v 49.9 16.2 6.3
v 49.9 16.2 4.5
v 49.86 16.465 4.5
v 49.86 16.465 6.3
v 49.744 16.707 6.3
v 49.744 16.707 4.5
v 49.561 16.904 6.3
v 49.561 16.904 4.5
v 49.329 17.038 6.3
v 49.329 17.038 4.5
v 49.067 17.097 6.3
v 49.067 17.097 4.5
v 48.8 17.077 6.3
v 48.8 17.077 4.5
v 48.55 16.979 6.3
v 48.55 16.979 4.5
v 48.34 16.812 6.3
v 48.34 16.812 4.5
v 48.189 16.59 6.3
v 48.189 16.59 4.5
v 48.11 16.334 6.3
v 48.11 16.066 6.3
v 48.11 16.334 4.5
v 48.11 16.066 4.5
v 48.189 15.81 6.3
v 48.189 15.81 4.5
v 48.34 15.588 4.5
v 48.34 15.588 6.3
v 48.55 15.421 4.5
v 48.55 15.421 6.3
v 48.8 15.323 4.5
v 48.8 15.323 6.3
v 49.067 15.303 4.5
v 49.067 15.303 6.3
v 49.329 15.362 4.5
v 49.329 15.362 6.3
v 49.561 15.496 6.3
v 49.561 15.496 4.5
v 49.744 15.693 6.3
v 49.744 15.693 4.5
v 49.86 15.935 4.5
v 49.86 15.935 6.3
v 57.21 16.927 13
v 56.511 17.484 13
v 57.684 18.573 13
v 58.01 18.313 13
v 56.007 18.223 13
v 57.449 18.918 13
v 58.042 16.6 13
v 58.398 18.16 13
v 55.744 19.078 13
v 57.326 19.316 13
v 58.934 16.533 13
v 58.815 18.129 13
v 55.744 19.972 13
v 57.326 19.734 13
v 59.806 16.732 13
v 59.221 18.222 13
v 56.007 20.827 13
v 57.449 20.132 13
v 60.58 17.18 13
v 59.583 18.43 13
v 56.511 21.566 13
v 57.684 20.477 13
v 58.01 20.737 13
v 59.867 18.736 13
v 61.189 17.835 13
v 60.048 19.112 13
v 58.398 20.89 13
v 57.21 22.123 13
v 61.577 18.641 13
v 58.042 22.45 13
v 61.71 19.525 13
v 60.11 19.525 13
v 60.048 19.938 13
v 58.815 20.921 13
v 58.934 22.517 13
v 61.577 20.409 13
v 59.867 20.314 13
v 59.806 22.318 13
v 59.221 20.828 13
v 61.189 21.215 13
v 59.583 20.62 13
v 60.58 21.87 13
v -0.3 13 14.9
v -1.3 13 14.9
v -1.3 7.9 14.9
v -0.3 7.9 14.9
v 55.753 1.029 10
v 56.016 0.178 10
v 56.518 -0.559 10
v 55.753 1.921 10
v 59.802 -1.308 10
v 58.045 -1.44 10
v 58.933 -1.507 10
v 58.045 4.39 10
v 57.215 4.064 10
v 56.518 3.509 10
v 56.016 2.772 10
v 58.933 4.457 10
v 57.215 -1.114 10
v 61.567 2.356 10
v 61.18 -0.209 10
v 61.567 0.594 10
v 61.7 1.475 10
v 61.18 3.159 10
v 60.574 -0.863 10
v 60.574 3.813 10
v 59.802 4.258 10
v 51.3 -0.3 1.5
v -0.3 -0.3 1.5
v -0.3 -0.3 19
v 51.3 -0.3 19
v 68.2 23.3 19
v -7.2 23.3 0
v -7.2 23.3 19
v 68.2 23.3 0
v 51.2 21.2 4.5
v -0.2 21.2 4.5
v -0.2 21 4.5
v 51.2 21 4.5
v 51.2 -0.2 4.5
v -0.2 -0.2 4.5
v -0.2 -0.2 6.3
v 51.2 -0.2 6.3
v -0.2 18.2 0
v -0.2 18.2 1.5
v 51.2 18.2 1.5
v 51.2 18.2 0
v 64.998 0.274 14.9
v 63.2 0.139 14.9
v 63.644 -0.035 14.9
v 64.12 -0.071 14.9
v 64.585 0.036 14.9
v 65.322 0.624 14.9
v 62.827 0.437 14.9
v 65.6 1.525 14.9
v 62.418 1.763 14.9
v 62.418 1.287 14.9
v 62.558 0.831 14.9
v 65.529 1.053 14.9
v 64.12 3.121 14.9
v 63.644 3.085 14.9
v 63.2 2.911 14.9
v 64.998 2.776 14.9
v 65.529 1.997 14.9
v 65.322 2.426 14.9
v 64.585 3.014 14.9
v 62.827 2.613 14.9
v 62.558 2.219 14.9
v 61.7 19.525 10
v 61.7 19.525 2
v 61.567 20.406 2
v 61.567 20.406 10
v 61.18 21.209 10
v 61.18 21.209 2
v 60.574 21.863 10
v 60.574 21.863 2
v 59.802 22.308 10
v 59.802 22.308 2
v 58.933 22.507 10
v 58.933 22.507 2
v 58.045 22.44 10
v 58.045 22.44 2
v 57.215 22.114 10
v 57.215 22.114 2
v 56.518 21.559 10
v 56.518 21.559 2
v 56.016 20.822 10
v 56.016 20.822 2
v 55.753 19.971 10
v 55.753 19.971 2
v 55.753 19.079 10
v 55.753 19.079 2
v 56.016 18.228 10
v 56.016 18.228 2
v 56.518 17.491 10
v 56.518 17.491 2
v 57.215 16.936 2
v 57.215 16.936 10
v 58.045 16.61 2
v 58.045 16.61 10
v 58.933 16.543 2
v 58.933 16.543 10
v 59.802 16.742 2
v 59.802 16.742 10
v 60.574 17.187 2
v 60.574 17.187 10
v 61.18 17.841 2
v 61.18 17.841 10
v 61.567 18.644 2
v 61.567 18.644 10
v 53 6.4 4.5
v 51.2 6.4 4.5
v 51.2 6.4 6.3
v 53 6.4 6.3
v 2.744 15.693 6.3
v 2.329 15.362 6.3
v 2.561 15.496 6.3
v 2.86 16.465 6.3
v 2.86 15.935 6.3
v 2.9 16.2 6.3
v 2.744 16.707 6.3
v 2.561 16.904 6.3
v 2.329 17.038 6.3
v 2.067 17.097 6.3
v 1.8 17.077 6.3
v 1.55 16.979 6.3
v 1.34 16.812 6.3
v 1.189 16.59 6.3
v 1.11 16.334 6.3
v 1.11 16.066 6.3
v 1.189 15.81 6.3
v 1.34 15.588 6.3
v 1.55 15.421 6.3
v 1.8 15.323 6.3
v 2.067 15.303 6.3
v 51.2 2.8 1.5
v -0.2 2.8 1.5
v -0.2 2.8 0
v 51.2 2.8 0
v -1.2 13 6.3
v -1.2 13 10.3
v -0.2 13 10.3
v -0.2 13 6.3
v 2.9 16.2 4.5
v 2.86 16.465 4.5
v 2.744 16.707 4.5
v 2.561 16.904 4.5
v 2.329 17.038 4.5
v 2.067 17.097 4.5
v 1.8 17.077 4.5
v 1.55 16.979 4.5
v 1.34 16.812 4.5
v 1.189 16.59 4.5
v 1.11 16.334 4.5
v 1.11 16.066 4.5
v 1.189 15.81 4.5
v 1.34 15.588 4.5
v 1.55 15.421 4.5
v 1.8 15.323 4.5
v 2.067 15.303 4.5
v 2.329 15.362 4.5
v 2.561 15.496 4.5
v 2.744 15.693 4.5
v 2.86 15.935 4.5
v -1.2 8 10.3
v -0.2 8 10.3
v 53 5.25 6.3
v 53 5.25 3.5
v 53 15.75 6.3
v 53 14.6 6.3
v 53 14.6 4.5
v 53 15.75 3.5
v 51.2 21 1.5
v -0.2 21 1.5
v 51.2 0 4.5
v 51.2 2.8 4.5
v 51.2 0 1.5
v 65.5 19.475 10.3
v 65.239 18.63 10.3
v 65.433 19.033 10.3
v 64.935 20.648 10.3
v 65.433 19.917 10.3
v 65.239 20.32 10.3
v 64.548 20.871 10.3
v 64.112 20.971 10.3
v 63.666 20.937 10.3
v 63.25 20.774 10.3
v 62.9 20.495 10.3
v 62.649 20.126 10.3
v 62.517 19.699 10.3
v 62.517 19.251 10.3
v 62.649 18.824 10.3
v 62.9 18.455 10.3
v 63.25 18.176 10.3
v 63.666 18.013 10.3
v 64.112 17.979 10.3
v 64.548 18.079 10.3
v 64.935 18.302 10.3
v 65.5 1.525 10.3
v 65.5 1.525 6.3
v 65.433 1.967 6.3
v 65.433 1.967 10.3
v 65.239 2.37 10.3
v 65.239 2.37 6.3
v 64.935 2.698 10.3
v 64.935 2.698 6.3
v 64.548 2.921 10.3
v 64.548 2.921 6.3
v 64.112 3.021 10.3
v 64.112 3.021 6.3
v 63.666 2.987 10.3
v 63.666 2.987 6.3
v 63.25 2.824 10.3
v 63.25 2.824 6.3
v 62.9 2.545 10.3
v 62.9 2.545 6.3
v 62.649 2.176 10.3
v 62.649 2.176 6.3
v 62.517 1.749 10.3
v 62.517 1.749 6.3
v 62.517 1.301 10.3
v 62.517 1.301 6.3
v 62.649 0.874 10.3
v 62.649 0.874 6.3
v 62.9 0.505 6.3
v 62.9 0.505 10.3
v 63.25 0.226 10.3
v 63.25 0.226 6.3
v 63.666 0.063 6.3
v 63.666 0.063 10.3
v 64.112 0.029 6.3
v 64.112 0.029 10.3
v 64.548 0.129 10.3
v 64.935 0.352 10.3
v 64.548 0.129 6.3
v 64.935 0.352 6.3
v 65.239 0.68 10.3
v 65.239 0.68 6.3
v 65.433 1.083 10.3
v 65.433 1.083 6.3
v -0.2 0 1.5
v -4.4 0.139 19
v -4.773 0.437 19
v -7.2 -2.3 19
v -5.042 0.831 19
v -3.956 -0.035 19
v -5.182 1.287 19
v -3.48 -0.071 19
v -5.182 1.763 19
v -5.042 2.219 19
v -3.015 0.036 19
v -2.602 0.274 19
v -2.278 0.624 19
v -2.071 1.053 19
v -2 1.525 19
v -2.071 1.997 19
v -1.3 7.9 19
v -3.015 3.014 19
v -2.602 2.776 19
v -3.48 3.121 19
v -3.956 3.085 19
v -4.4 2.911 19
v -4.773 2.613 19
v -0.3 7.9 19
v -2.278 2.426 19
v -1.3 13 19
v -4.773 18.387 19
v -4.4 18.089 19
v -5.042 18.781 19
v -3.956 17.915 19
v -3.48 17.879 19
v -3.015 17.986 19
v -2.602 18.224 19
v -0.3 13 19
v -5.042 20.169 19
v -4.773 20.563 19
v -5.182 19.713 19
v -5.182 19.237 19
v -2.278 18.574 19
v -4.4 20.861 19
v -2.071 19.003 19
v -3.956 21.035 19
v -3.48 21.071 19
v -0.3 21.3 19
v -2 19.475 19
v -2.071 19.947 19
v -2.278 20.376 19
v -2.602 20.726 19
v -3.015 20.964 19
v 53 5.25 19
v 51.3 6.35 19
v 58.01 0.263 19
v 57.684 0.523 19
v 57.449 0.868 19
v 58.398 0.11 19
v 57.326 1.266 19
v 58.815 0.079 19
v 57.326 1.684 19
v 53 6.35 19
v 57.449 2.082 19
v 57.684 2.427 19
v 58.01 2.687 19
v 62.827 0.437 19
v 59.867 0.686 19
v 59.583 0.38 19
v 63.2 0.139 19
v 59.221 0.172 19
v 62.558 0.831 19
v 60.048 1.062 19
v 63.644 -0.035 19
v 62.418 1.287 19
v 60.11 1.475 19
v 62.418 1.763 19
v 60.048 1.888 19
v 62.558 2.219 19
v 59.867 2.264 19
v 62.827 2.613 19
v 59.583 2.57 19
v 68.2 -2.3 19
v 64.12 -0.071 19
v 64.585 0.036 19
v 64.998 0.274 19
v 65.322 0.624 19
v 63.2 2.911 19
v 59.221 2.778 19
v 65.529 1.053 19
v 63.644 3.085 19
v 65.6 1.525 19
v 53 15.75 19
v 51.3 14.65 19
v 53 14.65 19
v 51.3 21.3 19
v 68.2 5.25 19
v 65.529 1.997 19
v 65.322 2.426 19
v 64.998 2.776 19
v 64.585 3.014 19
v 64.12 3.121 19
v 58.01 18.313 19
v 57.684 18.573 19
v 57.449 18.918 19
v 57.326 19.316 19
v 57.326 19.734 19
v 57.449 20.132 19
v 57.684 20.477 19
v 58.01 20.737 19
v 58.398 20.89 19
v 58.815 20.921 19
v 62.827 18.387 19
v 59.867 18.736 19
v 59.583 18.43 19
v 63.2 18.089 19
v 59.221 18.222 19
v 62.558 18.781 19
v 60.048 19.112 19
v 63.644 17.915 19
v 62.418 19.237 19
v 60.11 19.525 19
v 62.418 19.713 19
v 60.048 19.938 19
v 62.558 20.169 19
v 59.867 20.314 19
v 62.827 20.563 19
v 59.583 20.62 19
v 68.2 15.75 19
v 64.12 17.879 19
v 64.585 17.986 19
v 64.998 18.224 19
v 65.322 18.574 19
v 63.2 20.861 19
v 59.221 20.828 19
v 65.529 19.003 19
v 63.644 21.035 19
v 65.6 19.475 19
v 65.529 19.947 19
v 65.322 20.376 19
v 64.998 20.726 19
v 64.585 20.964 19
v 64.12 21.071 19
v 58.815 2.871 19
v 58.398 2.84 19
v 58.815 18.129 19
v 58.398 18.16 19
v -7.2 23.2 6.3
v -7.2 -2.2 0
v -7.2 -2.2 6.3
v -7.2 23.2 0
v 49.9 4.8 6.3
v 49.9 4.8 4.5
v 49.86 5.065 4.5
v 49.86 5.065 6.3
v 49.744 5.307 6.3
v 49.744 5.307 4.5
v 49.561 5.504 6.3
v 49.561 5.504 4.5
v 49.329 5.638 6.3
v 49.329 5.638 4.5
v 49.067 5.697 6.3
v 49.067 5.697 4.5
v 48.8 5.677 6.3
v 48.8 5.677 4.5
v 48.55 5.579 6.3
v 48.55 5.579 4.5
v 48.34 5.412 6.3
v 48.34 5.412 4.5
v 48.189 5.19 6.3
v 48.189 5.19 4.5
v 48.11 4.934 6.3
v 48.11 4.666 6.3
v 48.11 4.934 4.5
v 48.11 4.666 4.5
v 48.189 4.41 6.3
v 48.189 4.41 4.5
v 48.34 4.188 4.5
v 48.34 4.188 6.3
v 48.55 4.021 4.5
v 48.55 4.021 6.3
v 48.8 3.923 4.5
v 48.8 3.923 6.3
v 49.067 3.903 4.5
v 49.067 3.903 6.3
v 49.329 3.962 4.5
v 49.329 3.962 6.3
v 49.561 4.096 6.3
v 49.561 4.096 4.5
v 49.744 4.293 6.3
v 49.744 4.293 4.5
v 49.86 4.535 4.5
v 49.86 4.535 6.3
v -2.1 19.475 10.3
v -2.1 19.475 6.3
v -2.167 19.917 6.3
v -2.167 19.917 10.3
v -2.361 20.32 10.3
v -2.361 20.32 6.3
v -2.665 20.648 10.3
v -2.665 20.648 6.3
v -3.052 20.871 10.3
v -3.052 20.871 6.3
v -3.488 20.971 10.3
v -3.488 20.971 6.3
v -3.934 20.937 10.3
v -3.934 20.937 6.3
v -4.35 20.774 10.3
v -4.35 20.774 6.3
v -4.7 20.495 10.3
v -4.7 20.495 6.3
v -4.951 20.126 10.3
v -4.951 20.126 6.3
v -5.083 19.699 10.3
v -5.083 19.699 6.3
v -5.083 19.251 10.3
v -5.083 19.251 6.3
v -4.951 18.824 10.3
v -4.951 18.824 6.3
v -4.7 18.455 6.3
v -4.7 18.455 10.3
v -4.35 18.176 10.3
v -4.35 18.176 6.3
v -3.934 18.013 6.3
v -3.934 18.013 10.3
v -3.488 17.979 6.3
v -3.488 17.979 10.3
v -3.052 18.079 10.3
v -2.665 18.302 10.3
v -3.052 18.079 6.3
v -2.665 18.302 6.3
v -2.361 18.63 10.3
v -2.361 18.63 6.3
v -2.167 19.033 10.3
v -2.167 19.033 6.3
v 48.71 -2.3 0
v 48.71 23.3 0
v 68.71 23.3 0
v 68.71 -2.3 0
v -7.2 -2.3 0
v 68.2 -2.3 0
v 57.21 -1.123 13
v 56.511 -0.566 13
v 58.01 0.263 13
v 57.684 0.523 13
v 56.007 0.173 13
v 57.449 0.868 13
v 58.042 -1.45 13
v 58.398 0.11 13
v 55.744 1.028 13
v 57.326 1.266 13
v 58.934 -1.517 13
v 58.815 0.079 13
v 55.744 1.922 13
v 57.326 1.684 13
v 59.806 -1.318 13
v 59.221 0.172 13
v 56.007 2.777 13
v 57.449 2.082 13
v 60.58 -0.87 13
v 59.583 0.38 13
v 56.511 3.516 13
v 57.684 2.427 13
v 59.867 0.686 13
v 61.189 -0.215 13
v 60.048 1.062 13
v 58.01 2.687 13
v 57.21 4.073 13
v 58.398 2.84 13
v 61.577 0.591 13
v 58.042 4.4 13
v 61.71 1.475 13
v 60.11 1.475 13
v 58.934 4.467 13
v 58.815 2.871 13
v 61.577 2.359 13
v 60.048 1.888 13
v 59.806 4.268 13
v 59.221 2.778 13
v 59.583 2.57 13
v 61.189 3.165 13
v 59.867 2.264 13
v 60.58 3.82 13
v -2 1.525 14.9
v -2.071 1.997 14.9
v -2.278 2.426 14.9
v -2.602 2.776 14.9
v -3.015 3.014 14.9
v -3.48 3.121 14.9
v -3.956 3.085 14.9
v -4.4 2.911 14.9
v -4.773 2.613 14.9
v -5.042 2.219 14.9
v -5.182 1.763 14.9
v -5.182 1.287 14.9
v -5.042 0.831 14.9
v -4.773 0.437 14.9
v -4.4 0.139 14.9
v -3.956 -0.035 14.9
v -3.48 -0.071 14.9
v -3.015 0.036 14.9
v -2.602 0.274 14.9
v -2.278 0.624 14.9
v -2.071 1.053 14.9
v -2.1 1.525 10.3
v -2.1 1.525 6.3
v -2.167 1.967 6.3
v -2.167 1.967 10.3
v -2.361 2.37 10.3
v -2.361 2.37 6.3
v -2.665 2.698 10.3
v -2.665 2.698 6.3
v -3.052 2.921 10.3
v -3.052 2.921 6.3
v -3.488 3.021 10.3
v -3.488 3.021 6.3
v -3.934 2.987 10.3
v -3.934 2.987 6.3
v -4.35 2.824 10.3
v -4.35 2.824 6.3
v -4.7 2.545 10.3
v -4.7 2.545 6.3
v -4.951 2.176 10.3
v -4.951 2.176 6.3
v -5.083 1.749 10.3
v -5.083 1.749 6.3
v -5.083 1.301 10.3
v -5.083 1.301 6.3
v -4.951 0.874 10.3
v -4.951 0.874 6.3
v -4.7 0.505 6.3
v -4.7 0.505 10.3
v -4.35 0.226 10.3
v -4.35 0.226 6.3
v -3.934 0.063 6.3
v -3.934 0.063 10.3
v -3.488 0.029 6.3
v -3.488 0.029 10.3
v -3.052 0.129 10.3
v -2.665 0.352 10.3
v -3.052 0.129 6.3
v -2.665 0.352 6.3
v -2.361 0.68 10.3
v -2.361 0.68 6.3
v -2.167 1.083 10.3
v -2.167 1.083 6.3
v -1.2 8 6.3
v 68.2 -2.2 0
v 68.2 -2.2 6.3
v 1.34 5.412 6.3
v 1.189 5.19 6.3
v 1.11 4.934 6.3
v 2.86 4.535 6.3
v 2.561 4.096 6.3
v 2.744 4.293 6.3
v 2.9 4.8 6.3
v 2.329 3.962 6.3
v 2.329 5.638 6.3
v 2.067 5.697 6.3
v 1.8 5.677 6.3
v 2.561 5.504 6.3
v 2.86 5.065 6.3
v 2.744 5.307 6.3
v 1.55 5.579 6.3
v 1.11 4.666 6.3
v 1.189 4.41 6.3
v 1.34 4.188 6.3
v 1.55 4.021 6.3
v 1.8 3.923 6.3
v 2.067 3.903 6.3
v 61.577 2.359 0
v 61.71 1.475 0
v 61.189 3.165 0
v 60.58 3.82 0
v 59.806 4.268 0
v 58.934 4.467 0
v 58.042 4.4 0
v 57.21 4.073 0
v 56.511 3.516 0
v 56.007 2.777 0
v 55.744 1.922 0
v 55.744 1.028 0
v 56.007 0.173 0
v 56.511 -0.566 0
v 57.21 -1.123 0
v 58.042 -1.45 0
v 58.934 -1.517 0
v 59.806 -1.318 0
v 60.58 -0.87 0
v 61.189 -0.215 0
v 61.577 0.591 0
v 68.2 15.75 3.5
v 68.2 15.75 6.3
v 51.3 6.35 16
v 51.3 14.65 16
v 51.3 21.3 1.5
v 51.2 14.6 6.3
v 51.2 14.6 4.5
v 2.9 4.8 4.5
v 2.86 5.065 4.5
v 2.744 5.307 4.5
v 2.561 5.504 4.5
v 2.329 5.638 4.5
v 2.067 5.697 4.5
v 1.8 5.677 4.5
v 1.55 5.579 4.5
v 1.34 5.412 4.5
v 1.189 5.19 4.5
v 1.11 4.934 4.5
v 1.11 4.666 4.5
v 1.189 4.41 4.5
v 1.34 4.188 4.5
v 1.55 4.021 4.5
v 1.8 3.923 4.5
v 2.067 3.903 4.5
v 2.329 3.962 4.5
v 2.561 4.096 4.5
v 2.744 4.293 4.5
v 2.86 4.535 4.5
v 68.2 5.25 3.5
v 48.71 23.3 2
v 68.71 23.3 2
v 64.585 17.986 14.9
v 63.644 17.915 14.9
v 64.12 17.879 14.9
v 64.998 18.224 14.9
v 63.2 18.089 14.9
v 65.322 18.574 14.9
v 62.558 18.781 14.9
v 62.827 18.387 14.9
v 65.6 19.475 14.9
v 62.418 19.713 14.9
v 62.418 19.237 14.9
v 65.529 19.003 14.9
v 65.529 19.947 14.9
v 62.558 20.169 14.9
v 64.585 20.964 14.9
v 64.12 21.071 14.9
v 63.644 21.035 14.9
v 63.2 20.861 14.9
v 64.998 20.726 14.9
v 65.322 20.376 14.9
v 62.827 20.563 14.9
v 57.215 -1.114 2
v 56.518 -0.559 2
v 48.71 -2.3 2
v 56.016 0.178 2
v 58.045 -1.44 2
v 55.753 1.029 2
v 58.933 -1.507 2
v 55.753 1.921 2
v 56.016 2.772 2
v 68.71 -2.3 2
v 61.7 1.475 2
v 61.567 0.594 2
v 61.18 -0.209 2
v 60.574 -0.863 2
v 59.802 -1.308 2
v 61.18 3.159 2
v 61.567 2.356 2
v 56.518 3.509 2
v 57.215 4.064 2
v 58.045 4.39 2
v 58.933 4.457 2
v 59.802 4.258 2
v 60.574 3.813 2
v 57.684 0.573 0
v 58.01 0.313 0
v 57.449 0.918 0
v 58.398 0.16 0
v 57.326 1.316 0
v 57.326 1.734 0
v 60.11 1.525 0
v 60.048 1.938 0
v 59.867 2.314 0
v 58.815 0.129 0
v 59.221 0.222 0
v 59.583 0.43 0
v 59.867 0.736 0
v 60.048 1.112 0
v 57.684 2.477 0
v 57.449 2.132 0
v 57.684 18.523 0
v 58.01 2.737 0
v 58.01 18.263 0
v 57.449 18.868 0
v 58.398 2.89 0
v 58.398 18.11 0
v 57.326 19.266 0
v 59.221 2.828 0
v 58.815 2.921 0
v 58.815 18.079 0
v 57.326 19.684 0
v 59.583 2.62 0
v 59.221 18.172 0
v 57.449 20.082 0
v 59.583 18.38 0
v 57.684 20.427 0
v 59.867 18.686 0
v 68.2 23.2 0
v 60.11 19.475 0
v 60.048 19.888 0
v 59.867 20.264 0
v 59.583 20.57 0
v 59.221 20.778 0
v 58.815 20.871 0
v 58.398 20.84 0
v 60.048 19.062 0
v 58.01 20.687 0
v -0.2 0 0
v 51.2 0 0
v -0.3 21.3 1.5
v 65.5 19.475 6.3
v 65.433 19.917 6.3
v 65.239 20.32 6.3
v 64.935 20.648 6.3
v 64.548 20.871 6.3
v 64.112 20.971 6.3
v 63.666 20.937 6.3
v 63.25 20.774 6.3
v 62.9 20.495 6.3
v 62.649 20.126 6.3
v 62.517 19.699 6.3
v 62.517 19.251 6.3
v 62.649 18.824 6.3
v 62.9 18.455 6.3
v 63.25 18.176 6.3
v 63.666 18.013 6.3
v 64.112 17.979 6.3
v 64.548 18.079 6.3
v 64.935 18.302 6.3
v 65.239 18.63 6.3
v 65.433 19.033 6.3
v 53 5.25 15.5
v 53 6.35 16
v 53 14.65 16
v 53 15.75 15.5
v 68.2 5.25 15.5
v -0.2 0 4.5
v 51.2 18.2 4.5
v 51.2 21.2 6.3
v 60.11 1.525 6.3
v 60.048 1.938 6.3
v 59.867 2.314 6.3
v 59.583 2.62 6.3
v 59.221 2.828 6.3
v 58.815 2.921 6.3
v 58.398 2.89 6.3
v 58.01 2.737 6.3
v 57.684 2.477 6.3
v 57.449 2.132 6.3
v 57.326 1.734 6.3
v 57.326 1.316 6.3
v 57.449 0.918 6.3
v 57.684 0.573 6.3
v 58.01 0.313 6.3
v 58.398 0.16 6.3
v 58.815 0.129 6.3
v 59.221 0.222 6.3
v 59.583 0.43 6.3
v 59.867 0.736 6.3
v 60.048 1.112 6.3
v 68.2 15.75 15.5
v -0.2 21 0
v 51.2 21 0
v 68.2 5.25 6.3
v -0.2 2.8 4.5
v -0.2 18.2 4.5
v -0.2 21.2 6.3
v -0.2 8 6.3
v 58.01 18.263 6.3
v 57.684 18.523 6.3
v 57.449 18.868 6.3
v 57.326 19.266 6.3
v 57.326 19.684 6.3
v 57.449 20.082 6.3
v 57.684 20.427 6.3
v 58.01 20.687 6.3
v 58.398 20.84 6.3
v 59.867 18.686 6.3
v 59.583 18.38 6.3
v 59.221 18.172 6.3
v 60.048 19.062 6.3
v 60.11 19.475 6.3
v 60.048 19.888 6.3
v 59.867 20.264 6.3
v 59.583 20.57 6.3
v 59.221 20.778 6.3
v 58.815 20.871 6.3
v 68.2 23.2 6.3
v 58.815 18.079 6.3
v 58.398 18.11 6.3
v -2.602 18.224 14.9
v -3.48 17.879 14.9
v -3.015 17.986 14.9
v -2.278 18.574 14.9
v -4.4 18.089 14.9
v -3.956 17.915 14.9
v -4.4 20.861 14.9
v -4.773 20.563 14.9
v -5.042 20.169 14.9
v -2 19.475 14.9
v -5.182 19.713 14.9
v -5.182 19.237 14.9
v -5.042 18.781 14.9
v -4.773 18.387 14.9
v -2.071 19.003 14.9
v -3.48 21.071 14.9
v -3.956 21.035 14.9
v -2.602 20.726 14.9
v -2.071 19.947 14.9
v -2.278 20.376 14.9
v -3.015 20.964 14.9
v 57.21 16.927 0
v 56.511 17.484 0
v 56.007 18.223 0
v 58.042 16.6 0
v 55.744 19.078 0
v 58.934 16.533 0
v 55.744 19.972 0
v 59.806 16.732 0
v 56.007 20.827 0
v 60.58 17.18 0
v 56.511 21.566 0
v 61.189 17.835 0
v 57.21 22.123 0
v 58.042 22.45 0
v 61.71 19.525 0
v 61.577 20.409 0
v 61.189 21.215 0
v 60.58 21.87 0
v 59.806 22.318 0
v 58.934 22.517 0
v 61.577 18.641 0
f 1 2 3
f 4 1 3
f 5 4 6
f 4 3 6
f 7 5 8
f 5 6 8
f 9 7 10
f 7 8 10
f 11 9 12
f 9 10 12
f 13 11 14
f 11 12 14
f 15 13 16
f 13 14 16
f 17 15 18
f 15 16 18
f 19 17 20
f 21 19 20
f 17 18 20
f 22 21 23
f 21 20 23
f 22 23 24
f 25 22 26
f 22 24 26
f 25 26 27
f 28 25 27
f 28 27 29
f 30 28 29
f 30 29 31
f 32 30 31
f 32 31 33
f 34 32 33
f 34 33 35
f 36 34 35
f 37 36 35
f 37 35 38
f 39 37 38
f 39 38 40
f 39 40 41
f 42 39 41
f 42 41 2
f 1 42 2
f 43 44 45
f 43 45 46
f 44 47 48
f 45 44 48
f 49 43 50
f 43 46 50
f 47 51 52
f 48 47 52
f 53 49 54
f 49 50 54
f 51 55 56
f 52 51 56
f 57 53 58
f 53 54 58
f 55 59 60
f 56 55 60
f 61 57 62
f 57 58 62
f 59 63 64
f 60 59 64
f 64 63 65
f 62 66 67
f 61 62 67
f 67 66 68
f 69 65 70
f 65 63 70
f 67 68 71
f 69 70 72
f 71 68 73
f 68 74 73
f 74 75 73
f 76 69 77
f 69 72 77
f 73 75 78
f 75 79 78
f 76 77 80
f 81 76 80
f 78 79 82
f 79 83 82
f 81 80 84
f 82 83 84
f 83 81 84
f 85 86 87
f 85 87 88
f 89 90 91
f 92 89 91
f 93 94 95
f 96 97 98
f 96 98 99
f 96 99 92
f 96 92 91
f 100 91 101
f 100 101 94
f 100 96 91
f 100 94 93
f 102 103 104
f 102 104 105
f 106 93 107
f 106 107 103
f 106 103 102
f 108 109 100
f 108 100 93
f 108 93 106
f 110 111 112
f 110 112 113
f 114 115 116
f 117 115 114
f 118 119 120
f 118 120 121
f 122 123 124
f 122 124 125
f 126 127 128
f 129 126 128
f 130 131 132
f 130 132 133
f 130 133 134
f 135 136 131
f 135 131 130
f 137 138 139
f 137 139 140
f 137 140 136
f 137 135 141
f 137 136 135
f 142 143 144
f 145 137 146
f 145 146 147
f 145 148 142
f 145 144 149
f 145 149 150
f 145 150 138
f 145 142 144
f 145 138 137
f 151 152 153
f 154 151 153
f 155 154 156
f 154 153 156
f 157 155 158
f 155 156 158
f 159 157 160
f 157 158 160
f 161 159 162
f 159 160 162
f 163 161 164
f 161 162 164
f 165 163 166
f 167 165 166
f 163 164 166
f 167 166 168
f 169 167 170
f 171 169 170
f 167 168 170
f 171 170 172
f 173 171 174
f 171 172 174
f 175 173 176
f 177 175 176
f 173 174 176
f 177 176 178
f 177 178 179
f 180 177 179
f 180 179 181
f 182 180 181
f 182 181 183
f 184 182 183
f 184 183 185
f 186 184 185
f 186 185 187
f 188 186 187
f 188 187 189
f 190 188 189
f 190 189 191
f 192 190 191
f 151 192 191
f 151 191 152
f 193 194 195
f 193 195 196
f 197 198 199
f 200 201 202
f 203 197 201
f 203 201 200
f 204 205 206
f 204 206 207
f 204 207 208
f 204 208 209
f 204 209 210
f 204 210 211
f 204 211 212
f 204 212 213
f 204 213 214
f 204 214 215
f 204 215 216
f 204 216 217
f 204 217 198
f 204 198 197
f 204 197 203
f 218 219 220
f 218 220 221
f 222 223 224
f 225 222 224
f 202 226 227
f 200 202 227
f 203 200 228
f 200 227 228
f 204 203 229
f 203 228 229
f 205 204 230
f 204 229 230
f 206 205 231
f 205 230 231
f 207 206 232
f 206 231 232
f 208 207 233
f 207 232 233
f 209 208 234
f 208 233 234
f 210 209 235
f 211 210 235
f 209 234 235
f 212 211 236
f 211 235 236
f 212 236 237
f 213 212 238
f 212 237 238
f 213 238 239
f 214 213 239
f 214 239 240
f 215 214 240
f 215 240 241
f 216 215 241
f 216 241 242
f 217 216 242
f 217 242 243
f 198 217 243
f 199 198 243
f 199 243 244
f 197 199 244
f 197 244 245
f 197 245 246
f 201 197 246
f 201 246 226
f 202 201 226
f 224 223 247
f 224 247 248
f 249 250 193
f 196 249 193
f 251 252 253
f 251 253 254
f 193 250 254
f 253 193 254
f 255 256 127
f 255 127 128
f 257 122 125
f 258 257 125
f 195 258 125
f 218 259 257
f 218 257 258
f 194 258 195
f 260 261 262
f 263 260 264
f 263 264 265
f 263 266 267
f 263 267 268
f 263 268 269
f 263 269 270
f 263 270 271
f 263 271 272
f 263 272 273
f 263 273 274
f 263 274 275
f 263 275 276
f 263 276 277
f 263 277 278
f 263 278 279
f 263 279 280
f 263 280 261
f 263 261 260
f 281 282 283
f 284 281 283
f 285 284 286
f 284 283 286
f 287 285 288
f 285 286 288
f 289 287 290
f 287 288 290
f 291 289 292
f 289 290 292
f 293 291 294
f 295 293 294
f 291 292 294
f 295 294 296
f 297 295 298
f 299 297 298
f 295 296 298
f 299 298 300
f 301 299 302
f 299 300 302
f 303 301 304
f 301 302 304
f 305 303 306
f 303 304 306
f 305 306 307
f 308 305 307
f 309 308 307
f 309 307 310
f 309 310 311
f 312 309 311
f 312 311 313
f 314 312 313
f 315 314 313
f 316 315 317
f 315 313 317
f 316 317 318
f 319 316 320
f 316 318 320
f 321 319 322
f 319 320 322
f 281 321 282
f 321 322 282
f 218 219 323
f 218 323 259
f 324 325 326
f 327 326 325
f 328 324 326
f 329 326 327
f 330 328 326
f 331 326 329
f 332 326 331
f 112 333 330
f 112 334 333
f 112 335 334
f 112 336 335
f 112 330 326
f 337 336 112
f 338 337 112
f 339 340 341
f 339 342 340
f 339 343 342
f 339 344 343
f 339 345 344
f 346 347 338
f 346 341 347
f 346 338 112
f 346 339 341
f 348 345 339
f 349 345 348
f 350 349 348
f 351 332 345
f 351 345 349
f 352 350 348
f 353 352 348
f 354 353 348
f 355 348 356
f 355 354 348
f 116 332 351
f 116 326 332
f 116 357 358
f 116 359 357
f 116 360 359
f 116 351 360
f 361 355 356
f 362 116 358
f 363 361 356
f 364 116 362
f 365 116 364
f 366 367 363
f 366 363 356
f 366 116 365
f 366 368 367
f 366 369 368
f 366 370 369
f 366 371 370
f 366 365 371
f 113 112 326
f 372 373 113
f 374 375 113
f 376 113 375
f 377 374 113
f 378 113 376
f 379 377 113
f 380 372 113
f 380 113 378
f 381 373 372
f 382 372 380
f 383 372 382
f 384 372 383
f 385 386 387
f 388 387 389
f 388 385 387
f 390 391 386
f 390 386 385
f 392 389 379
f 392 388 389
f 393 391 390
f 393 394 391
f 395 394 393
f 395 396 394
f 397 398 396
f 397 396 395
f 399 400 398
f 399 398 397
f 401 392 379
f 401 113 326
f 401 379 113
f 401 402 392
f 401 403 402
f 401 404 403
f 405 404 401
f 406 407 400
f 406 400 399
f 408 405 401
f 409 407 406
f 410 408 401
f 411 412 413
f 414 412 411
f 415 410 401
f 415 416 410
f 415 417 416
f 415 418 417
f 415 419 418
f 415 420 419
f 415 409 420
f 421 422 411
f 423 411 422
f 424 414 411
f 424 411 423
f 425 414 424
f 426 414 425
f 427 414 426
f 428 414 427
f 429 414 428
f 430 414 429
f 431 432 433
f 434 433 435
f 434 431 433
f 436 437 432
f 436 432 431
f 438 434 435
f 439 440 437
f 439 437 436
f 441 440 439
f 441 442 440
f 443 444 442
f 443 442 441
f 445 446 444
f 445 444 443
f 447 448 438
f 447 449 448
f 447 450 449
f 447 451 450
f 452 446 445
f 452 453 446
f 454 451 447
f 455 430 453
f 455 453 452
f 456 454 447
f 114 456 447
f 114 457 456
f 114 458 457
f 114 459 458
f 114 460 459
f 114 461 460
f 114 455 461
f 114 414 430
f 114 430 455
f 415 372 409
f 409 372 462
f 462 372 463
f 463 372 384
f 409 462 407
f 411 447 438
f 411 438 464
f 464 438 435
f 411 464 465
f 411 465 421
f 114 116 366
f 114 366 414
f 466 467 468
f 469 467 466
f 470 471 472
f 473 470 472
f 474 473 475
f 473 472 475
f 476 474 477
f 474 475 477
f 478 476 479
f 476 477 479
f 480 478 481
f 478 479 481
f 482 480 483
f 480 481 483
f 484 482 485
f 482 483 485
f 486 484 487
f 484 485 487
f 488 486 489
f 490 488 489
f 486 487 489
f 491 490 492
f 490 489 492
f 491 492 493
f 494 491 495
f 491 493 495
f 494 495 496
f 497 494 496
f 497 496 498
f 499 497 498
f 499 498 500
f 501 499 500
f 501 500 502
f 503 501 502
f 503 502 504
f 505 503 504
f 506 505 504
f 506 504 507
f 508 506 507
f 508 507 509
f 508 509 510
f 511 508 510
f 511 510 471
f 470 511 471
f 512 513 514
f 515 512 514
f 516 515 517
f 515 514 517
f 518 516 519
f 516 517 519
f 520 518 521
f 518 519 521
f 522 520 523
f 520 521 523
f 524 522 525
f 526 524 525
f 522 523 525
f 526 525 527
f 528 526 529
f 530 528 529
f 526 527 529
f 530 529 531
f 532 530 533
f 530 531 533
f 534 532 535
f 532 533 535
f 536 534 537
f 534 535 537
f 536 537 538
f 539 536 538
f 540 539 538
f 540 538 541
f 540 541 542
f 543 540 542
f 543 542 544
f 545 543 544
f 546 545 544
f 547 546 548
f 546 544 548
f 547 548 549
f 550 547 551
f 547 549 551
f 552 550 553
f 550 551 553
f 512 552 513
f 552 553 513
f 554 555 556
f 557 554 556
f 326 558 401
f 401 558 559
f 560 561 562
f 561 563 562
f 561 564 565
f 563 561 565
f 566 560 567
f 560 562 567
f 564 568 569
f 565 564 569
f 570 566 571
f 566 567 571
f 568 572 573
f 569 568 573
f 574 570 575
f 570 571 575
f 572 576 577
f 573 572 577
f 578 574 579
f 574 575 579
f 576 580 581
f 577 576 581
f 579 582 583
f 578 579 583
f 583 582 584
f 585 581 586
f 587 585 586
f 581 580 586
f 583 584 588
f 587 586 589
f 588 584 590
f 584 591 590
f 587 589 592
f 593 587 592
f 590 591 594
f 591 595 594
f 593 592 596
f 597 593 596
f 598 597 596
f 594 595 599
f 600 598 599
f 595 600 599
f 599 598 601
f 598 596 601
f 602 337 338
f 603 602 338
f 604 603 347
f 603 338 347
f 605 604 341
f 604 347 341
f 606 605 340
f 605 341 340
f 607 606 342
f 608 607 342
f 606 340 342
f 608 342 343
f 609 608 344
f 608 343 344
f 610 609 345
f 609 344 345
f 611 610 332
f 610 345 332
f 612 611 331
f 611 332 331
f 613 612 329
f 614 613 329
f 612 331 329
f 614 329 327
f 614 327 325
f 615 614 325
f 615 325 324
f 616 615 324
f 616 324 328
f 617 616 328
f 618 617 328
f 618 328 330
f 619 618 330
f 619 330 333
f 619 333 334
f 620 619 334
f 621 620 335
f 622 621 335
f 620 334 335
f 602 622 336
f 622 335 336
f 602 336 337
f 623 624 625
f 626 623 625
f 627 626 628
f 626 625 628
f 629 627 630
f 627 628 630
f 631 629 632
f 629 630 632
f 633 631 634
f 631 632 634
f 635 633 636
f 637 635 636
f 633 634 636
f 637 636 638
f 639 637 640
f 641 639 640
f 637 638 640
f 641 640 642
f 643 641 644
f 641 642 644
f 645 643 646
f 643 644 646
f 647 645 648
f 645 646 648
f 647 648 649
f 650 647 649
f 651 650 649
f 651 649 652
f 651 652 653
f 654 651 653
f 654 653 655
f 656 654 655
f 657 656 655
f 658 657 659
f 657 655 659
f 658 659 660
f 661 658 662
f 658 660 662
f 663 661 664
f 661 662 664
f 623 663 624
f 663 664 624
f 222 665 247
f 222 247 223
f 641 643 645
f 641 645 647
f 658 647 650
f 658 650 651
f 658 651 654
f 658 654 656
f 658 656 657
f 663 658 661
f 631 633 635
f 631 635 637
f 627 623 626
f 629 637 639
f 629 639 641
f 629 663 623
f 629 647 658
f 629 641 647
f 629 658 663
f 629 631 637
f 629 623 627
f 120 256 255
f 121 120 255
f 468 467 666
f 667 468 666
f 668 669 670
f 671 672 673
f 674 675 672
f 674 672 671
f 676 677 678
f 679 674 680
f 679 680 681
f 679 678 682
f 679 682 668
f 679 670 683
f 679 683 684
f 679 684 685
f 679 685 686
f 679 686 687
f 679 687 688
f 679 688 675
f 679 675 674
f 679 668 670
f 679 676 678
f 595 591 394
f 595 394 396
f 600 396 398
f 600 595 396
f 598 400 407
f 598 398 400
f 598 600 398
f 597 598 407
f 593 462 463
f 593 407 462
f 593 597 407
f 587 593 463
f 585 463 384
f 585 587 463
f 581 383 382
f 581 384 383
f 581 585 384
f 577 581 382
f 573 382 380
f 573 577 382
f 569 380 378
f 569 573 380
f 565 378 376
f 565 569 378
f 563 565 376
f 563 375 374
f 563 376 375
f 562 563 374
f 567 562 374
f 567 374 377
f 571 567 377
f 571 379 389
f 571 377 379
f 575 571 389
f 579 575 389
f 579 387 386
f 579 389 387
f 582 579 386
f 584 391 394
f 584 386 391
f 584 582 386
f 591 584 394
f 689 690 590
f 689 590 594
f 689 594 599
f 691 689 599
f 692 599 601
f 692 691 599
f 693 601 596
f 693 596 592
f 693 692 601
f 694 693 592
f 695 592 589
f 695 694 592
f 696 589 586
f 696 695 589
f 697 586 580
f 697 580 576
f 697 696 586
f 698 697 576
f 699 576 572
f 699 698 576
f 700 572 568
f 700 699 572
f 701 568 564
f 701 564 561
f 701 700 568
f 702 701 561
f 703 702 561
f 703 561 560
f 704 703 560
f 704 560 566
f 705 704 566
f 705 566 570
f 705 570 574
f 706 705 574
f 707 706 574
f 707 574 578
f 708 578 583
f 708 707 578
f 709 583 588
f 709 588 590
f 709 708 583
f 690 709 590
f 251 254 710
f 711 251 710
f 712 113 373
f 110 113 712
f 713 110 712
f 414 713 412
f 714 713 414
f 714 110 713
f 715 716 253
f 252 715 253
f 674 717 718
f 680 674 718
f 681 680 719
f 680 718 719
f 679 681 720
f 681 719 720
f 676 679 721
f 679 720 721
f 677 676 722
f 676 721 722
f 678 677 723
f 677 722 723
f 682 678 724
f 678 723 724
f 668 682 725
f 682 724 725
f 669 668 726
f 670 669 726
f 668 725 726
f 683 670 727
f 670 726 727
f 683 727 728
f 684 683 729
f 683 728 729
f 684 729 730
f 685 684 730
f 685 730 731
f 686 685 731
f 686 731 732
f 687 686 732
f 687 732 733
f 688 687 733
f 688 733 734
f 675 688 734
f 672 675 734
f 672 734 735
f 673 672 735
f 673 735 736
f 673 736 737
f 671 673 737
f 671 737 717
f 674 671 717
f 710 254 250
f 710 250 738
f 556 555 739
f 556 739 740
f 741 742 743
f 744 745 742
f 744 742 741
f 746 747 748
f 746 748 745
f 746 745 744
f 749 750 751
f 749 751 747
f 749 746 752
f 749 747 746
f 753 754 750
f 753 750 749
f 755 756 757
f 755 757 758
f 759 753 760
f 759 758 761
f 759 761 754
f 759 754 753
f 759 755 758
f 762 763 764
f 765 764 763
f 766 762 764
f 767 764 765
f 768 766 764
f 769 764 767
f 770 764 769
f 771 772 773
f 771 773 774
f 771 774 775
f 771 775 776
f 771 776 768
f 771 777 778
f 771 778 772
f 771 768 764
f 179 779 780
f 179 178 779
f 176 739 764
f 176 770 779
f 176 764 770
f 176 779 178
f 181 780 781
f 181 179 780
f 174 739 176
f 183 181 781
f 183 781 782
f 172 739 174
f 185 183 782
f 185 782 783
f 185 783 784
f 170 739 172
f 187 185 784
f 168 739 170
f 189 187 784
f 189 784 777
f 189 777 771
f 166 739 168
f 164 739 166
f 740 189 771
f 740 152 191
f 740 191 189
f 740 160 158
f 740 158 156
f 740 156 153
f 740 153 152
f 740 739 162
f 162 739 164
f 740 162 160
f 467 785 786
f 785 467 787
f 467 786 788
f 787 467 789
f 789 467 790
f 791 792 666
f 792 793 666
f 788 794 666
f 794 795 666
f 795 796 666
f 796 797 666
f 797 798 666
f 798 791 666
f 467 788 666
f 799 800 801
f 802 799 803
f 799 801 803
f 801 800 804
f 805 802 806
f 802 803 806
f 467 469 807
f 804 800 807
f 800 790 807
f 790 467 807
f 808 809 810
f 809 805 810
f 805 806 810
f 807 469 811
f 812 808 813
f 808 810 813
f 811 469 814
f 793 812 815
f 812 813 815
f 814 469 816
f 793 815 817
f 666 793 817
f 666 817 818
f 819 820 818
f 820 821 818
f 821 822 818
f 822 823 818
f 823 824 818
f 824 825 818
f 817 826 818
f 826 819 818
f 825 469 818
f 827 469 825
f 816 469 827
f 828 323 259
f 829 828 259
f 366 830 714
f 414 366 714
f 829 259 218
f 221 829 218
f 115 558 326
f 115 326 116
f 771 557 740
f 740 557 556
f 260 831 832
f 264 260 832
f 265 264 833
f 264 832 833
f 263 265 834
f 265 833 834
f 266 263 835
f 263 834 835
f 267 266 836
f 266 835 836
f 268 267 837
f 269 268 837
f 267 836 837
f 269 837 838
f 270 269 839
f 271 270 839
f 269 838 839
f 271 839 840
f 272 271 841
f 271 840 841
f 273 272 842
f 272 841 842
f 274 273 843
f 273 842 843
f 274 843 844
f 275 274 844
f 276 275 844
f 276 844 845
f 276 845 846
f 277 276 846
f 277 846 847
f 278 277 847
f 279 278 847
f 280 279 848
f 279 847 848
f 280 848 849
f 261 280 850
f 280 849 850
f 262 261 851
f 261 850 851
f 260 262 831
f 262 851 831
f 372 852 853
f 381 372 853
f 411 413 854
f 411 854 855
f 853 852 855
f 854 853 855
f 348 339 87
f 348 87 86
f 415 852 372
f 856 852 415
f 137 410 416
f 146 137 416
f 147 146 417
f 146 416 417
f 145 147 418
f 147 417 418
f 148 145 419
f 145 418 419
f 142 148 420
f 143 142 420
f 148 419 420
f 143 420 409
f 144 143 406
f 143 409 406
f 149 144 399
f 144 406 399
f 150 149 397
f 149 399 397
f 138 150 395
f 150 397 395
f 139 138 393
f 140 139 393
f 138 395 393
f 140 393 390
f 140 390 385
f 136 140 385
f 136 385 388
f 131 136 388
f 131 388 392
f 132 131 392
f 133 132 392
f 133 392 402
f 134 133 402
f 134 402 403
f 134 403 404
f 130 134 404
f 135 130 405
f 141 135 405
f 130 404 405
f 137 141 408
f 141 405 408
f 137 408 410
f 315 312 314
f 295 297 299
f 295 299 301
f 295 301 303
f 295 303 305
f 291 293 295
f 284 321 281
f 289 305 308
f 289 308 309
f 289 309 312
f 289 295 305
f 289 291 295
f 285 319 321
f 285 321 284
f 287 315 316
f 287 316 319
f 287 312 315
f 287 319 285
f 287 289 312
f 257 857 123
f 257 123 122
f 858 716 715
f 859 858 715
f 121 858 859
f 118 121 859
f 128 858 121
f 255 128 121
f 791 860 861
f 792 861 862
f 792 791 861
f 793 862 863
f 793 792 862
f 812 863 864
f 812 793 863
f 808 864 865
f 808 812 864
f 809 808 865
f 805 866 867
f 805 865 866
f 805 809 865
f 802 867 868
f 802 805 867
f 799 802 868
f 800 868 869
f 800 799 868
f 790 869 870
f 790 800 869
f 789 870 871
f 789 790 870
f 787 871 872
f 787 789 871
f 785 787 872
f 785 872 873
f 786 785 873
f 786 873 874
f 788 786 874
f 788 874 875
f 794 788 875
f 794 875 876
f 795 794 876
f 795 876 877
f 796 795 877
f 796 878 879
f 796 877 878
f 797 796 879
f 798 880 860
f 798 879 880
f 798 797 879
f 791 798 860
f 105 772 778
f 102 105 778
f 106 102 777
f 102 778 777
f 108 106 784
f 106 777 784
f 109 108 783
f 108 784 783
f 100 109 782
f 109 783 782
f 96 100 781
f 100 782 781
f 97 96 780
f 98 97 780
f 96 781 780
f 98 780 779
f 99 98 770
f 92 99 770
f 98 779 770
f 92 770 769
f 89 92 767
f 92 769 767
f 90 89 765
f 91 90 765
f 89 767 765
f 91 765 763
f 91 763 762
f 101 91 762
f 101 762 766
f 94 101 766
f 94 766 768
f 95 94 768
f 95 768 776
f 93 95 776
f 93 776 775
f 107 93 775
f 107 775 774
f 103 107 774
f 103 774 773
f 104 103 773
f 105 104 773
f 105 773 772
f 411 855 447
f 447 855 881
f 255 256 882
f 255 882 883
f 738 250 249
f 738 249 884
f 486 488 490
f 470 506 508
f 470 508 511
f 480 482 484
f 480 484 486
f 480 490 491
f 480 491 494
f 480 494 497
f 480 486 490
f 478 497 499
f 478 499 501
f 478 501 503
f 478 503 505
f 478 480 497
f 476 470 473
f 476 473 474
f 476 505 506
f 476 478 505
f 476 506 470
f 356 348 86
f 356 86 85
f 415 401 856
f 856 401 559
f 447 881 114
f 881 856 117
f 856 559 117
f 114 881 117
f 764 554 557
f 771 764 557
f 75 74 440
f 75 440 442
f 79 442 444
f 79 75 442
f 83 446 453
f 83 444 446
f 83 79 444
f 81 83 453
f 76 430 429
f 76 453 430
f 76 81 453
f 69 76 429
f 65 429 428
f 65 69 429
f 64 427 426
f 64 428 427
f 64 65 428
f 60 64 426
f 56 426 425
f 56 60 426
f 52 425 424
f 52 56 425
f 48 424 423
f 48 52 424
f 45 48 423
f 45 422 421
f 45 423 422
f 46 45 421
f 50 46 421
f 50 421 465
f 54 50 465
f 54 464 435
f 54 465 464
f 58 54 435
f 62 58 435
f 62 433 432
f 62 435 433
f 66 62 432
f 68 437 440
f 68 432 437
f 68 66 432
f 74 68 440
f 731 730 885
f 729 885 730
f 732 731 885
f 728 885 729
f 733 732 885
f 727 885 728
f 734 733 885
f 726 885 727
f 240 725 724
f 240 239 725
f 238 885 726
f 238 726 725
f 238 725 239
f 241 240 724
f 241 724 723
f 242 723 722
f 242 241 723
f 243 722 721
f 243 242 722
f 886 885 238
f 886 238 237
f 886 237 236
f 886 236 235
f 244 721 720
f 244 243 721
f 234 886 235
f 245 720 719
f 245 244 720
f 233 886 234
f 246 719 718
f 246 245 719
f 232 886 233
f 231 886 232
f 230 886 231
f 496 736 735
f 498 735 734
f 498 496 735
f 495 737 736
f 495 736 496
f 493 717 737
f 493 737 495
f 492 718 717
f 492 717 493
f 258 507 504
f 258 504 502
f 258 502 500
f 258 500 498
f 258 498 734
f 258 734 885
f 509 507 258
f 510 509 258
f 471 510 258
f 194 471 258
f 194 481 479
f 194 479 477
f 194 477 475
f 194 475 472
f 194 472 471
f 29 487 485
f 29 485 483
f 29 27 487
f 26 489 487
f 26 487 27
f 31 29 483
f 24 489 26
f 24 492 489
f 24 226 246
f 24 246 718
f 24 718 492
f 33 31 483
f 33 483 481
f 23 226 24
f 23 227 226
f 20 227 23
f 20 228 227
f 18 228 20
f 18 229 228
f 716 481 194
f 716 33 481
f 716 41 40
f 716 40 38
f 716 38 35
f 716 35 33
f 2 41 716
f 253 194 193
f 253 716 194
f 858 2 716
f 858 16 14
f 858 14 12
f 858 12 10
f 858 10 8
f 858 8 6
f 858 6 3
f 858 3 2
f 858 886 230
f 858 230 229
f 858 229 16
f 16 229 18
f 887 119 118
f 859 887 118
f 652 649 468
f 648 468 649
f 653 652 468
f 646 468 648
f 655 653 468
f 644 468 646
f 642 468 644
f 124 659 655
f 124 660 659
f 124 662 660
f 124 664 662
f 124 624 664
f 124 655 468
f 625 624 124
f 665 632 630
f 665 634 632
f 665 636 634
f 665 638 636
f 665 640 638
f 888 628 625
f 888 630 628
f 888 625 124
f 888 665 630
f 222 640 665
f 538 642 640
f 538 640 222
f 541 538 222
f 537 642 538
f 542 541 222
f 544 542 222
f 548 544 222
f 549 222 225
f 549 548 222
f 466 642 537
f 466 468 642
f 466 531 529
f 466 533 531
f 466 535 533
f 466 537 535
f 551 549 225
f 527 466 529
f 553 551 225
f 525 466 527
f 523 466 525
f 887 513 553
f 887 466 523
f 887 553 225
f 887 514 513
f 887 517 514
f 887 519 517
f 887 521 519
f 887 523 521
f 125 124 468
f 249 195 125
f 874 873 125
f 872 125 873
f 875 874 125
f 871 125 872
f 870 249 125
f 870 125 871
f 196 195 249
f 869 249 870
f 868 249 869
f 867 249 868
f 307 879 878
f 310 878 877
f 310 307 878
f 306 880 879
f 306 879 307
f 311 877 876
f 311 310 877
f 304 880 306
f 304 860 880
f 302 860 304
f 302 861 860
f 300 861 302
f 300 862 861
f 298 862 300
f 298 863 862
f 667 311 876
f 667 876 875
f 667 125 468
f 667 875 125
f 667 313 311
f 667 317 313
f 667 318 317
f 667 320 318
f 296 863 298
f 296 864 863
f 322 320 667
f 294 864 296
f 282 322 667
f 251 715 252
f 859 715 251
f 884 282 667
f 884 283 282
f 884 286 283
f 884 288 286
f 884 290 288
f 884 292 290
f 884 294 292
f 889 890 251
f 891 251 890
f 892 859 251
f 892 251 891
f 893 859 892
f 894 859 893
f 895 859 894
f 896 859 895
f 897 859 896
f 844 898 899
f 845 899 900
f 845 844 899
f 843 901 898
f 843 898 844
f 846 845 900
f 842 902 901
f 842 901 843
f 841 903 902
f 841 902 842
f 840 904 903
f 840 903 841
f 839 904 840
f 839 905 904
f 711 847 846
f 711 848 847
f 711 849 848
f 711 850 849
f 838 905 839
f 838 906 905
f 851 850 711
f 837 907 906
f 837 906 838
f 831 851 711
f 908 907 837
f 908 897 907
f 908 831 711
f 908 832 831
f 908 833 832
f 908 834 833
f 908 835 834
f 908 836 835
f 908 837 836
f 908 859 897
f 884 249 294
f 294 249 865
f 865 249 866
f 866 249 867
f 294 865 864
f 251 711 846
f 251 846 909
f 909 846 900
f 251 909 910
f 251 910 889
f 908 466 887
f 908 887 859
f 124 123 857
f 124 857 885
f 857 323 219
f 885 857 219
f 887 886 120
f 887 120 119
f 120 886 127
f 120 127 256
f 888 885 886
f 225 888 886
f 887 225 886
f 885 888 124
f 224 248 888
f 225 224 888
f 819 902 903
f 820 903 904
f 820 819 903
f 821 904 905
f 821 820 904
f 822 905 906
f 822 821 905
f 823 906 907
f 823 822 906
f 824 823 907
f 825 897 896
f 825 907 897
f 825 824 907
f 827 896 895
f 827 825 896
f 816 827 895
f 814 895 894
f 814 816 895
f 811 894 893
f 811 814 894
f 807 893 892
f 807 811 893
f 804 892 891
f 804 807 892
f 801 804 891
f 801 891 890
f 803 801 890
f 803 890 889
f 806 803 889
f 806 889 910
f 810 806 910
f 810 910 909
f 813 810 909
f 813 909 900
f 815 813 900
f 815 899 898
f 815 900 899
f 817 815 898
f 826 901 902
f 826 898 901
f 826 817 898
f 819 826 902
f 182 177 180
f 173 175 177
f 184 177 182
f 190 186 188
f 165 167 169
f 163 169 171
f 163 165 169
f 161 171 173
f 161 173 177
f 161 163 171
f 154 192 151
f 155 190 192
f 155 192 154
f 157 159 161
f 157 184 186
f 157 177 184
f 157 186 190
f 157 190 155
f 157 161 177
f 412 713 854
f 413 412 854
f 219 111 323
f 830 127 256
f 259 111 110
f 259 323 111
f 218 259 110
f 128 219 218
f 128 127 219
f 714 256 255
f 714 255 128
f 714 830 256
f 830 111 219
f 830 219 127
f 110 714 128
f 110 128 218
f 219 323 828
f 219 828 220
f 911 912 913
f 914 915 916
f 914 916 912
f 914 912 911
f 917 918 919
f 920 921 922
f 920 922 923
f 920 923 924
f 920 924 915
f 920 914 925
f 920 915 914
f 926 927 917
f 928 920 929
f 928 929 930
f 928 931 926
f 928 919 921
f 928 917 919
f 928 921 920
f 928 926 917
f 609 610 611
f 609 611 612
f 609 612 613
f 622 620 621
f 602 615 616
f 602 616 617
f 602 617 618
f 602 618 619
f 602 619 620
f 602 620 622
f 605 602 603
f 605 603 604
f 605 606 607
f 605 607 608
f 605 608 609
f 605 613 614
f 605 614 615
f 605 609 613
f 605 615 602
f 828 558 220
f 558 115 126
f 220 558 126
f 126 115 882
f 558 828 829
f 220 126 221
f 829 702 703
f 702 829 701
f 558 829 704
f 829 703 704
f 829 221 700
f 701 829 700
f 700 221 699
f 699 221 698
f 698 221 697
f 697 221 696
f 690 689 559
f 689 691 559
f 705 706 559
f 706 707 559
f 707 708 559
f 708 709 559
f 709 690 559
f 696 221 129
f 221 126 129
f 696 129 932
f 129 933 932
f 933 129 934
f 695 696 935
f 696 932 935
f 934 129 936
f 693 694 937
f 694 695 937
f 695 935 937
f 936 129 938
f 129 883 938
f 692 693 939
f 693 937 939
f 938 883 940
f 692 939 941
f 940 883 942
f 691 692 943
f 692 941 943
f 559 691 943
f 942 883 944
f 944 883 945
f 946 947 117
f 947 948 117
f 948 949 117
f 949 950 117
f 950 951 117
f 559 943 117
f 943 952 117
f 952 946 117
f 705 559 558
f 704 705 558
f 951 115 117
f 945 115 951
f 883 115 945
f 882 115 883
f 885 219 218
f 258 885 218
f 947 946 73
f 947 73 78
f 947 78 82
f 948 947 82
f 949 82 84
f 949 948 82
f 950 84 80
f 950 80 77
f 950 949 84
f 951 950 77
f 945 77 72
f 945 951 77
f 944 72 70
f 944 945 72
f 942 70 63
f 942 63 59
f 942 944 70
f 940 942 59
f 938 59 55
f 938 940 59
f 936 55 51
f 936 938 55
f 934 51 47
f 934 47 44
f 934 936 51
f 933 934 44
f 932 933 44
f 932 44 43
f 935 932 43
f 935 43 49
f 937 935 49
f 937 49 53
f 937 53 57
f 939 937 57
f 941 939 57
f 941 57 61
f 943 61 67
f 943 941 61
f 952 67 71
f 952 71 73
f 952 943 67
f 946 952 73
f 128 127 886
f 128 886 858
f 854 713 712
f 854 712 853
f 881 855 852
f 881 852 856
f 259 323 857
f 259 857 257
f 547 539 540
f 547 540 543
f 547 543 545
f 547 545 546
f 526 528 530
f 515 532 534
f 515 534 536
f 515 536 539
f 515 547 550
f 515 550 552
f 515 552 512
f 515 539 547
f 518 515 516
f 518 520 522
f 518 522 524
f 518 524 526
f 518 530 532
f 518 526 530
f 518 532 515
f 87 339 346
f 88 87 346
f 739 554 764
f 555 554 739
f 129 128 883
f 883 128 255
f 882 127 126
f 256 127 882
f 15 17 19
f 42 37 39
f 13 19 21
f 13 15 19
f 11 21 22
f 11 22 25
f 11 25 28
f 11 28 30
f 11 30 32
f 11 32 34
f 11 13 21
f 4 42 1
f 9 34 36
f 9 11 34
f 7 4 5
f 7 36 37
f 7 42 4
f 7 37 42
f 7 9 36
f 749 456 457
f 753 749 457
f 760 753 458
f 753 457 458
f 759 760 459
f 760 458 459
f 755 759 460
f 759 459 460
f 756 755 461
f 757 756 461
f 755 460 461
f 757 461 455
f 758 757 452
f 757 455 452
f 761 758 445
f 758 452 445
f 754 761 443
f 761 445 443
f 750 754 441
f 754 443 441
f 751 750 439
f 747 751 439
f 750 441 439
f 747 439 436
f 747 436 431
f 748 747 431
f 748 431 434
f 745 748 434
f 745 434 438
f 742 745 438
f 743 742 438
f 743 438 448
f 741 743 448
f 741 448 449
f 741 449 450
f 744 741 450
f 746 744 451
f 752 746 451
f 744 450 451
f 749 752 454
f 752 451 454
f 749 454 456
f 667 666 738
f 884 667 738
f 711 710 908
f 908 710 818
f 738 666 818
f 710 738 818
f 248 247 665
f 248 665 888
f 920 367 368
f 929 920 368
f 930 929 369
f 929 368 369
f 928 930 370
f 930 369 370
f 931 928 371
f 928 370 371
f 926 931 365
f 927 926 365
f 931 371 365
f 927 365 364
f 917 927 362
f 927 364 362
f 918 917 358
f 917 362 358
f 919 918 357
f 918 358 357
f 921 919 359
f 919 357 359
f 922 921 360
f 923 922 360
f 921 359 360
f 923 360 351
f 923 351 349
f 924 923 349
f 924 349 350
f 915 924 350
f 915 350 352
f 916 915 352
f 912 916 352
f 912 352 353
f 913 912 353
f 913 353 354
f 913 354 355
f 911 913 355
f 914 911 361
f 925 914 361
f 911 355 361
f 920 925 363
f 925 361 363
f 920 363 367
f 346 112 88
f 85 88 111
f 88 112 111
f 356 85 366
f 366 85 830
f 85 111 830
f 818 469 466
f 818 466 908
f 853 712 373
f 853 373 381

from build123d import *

# Parameters (mm, degrees)
SKETCH_W             = 75.4
SKETCH_H             = 25.4
PAD_DEPTH            = 6.3
SKETCH001_W          = 51.4
SKETCH001_H          = 2.8
POCKET_DEPTH         = 4.801
SKETCH002_W          = 51.4
SKETCH002_H          = 21.4
POCKET001_DEPTH      = 1.801
SKETCH003_R          = 0.9
PAD001_DEPTH         = 6.3
SKETCH004_W          = 3
SKETCH004_H          = 8.2
POCKET002_DEPTH      = 1.801
SKETCH005_W          = 20.2
SKETCH005_H          = 10.5
POCKET003_DEPTH      = 5
SKETCH006_R          = 1.4
POCKET004_DEPTH      = 0.001
POCKET004_DEPTH_BACK = -6.301
SKETCH016_R          = 1.5
SKETCH016_W          = 1
SKETCH016_H          = 5
PAD003_DEPTH         = 4
SKETCH007_W          = 75.4
SKETCH007_H          = 25.6
PAD002_DEPTH         = 19
SKETCH009_W          = 51.6
SKETCH009_H          = 21.6
POCKET006_DEPTH      = 17.501
SKETCH011_W          = 3
SKETCH011_H          = 8.3
POCKET007_DEPTH      = 3.001
SKETCH012_W          = 20.1
SKETCH012_H          = 10.5
POCKET008_DEPTH      = 5
SKETCH013_R          = 1.4
POCKET009_DEPTH      = 0.001
POCKET009_DEPTH_BACK = -19.001
SKETCH014_R          = 3
POCKET010_DEPTH      = 13
SKETCH015_W          = 51.4
SKETCH015_H          = 2.8
POCKET011_DEPTH      = 5
SKETCH017_R          = 1.6
SKETCH017_W          = 1.1
SKETCH017_H          = 5.1
POCKET012_DEPTH      = 4.1
SKETCH019_W          = 20
SKETCH019_H          = 25.6
PAD004_DEPTH         = 2
SKETCH018_R          = 2.99
PAD005_DEPTH         = 10


with BuildPart() as body:
    # Sketch → Pad (new body)
    with BuildSketch(Plane.XY):
        with Locations((30.5, 10.5)):
            Rectangle(SKETCH_W, SKETCH_H)
    extrude(amount=PAD_DEPTH)

    # Sketch001 → Pocket (cut, through all)
    with BuildSketch(Plane.XY.offset(1.5)):
        with Locations((25.5, 1.4)):
            Rectangle(SKETCH001_W, SKETCH001_H)
        with Locations((25.5, 19.6)):
            Rectangle(SKETCH001_W, SKETCH001_H)
    extrude(amount=POCKET_DEPTH, mode=Mode.SUBTRACT)

    # Sketch002 → Pocket001 (cut, through all)
    with BuildSketch(Plane.XY.offset(4.5)):
        with Locations((25.5, 10.5)):
            Rectangle(SKETCH002_W, SKETCH002_H)
    extrude(amount=POCKET001_DEPTH, mode=Mode.SUBTRACT)

    # Sketch003 → Pad001 (join)
    with BuildSketch(Plane.XY):
        with Locations((2, 16.2)):
            Circle(SKETCH003_R)
        with Locations((2, 4.8)):
            Circle(SKETCH003_R)
        with Locations((49, 16.2)):
            Circle(SKETCH003_R)
        with Locations((49, 4.8)):
            Circle(SKETCH003_R)
    extrude(amount=PAD001_DEPTH)

    # Sketch004 → Pocket002 (cut, through all)
    with BuildSketch(Plane.XY.offset(4.5)):
        with Locations((52.5, 10.5)):
            Rectangle(SKETCH004_W, SKETCH004_H)
    extrude(amount=POCKET002_DEPTH, mode=Mode.SUBTRACT)

    # Sketch005 → Pocket003 (cut)
    with BuildSketch(Plane.XY.offset(3.5)):
        with Locations((63.1, 10.5)):
            Rectangle(SKETCH005_W, SKETCH005_H)
    extrude(amount=POCKET003_DEPTH, mode=Mode.SUBTRACT)

    # Sketch006 → Pocket004 (cut, two sides)
    with BuildSketch(Plane.XY) as pocket004_sk:
        with Locations((58.71, 1.525)):
            Circle(SKETCH006_R)
        with Locations((58.71, 19.475)):
            Circle(SKETCH006_R)
    extrude(amount=-POCKET004_DEPTH, mode=Mode.SUBTRACT)
    extrude(pocket004_sk.sketch, amount=-POCKET004_DEPTH_BACK, mode=Mode.SUBTRACT)

    # Sketch016 → Pad003 (join)
    with BuildSketch(Plane.XY.offset(6.3)):
        with Locations((64, 19.475)):
            Circle(SKETCH016_R)
        with Locations((64, 1.525)):
            Circle(SKETCH016_R)
        with Locations((-3.6, 1.525)):
            Circle(SKETCH016_R)
        with Locations((-3.6, 19.475)):
            Circle(SKETCH016_R)
        with Locations((-0.7, 10.5)):
            Rectangle(SKETCH016_W, SKETCH016_H)
    extrude(amount=PAD003_DEPTH)


with BuildPart() as body001topcover:
    # Sketch007 → Pad002 (new body)
    with BuildSketch(Plane.XY):
        with Locations((30.5, 10.5)):
            Rectangle(SKETCH007_W, SKETCH007_H)
    extrude(amount=PAD002_DEPTH)

    # Sketch009 → Pocket006 (cut, through all)
    with BuildSketch(Plane.XY.offset(1.5)):
        with Locations((25.5, 10.5)):
            Rectangle(SKETCH009_W, SKETCH009_H)
    extrude(amount=POCKET006_DEPTH, mode=Mode.SUBTRACT)

    # Sketch011 → Pocket007 (cut, through all)
    with BuildSketch(Plane.XY.offset(16)):
        with Locations((52.5, 10.5)):
            Rectangle(SKETCH011_W, SKETCH011_H)
    extrude(amount=POCKET007_DEPTH, mode=Mode.SUBTRACT)

    # Sketch012 → Pocket008 (cut)
    with BuildSketch(Plane.XY.offset(15.5)):
        with Locations((63.05, 10.5)):
            Rectangle(SKETCH012_W, SKETCH012_H)
    extrude(amount=POCKET008_DEPTH, mode=Mode.SUBTRACT)

    # Sketch013 → Pocket009 (cut, two sides)
    with BuildSketch(Plane.XY) as pocket009_sk:
        with Locations((58.71, 1.475)):
            Circle(SKETCH013_R)
        with Locations((58.71, 19.525)):
            Circle(SKETCH013_R)
    extrude(amount=-POCKET009_DEPTH, mode=Mode.SUBTRACT)
    extrude(pocket009_sk.sketch, amount=-POCKET009_DEPTH_BACK, mode=Mode.SUBTRACT)

    # Sketch014 → Pocket010 (cut)
    with BuildSketch(Plane.XY):
        with Locations((58.71, 1.475)):
            Circle(SKETCH014_R)
        with Locations((58.71, 19.525)):
            Circle(SKETCH014_R)
    extrude(amount=POCKET010_DEPTH, mode=Mode.SUBTRACT)

    # Sketch015 → Pocket011 (cut)
    with BuildSketch(Plane.XY.offset(1.5)):
        with Locations((25.5, 1.4)):
            Rectangle(SKETCH015_W, SKETCH015_H)
        with Locations((25.5, 19.6)):
            Rectangle(SKETCH015_W, SKETCH015_H)
    extrude(amount=-POCKET011_DEPTH, mode=Mode.SUBTRACT)

    # Sketch017 → Pocket012 (cut)
    with BuildSketch(Plane.XY.offset(19)):
        with Locations((64, 19.475)):
            Circle(SKETCH017_R)
        with Locations((64, 1.525)):
            Circle(SKETCH017_R)
        with Locations((-3.6, 19.475)):
            Circle(SKETCH017_R)
        with Locations((-3.6, 1.525)):
            Circle(SKETCH017_R)
        with Locations((-0.75, 10.45)):
            Rectangle(SKETCH017_W, SKETCH017_H)
    extrude(amount=-POCKET012_DEPTH, mode=Mode.SUBTRACT)


with BuildPart() as body002wireholder:
    # Sketch019 → Pad004 (new body)
    with BuildSketch(Plane.XY):
        with Locations((58.71, 10.5)):
            Rectangle(SKETCH019_W, SKETCH019_H)
    extrude(amount=PAD004_DEPTH)

    # Sketch018 → Pad005 (join)
    with BuildSketch(Plane.XY):
        with Locations((58.71, 1.475)):
            Circle(SKETCH018_R)
        with Locations((58.71, 19.525)):
            Circle(SKETCH018_R)
    extrude(amount=PAD005_DEPTH)


solid = Compound([body.part, body001topcover.part, body002wireholder.part])
